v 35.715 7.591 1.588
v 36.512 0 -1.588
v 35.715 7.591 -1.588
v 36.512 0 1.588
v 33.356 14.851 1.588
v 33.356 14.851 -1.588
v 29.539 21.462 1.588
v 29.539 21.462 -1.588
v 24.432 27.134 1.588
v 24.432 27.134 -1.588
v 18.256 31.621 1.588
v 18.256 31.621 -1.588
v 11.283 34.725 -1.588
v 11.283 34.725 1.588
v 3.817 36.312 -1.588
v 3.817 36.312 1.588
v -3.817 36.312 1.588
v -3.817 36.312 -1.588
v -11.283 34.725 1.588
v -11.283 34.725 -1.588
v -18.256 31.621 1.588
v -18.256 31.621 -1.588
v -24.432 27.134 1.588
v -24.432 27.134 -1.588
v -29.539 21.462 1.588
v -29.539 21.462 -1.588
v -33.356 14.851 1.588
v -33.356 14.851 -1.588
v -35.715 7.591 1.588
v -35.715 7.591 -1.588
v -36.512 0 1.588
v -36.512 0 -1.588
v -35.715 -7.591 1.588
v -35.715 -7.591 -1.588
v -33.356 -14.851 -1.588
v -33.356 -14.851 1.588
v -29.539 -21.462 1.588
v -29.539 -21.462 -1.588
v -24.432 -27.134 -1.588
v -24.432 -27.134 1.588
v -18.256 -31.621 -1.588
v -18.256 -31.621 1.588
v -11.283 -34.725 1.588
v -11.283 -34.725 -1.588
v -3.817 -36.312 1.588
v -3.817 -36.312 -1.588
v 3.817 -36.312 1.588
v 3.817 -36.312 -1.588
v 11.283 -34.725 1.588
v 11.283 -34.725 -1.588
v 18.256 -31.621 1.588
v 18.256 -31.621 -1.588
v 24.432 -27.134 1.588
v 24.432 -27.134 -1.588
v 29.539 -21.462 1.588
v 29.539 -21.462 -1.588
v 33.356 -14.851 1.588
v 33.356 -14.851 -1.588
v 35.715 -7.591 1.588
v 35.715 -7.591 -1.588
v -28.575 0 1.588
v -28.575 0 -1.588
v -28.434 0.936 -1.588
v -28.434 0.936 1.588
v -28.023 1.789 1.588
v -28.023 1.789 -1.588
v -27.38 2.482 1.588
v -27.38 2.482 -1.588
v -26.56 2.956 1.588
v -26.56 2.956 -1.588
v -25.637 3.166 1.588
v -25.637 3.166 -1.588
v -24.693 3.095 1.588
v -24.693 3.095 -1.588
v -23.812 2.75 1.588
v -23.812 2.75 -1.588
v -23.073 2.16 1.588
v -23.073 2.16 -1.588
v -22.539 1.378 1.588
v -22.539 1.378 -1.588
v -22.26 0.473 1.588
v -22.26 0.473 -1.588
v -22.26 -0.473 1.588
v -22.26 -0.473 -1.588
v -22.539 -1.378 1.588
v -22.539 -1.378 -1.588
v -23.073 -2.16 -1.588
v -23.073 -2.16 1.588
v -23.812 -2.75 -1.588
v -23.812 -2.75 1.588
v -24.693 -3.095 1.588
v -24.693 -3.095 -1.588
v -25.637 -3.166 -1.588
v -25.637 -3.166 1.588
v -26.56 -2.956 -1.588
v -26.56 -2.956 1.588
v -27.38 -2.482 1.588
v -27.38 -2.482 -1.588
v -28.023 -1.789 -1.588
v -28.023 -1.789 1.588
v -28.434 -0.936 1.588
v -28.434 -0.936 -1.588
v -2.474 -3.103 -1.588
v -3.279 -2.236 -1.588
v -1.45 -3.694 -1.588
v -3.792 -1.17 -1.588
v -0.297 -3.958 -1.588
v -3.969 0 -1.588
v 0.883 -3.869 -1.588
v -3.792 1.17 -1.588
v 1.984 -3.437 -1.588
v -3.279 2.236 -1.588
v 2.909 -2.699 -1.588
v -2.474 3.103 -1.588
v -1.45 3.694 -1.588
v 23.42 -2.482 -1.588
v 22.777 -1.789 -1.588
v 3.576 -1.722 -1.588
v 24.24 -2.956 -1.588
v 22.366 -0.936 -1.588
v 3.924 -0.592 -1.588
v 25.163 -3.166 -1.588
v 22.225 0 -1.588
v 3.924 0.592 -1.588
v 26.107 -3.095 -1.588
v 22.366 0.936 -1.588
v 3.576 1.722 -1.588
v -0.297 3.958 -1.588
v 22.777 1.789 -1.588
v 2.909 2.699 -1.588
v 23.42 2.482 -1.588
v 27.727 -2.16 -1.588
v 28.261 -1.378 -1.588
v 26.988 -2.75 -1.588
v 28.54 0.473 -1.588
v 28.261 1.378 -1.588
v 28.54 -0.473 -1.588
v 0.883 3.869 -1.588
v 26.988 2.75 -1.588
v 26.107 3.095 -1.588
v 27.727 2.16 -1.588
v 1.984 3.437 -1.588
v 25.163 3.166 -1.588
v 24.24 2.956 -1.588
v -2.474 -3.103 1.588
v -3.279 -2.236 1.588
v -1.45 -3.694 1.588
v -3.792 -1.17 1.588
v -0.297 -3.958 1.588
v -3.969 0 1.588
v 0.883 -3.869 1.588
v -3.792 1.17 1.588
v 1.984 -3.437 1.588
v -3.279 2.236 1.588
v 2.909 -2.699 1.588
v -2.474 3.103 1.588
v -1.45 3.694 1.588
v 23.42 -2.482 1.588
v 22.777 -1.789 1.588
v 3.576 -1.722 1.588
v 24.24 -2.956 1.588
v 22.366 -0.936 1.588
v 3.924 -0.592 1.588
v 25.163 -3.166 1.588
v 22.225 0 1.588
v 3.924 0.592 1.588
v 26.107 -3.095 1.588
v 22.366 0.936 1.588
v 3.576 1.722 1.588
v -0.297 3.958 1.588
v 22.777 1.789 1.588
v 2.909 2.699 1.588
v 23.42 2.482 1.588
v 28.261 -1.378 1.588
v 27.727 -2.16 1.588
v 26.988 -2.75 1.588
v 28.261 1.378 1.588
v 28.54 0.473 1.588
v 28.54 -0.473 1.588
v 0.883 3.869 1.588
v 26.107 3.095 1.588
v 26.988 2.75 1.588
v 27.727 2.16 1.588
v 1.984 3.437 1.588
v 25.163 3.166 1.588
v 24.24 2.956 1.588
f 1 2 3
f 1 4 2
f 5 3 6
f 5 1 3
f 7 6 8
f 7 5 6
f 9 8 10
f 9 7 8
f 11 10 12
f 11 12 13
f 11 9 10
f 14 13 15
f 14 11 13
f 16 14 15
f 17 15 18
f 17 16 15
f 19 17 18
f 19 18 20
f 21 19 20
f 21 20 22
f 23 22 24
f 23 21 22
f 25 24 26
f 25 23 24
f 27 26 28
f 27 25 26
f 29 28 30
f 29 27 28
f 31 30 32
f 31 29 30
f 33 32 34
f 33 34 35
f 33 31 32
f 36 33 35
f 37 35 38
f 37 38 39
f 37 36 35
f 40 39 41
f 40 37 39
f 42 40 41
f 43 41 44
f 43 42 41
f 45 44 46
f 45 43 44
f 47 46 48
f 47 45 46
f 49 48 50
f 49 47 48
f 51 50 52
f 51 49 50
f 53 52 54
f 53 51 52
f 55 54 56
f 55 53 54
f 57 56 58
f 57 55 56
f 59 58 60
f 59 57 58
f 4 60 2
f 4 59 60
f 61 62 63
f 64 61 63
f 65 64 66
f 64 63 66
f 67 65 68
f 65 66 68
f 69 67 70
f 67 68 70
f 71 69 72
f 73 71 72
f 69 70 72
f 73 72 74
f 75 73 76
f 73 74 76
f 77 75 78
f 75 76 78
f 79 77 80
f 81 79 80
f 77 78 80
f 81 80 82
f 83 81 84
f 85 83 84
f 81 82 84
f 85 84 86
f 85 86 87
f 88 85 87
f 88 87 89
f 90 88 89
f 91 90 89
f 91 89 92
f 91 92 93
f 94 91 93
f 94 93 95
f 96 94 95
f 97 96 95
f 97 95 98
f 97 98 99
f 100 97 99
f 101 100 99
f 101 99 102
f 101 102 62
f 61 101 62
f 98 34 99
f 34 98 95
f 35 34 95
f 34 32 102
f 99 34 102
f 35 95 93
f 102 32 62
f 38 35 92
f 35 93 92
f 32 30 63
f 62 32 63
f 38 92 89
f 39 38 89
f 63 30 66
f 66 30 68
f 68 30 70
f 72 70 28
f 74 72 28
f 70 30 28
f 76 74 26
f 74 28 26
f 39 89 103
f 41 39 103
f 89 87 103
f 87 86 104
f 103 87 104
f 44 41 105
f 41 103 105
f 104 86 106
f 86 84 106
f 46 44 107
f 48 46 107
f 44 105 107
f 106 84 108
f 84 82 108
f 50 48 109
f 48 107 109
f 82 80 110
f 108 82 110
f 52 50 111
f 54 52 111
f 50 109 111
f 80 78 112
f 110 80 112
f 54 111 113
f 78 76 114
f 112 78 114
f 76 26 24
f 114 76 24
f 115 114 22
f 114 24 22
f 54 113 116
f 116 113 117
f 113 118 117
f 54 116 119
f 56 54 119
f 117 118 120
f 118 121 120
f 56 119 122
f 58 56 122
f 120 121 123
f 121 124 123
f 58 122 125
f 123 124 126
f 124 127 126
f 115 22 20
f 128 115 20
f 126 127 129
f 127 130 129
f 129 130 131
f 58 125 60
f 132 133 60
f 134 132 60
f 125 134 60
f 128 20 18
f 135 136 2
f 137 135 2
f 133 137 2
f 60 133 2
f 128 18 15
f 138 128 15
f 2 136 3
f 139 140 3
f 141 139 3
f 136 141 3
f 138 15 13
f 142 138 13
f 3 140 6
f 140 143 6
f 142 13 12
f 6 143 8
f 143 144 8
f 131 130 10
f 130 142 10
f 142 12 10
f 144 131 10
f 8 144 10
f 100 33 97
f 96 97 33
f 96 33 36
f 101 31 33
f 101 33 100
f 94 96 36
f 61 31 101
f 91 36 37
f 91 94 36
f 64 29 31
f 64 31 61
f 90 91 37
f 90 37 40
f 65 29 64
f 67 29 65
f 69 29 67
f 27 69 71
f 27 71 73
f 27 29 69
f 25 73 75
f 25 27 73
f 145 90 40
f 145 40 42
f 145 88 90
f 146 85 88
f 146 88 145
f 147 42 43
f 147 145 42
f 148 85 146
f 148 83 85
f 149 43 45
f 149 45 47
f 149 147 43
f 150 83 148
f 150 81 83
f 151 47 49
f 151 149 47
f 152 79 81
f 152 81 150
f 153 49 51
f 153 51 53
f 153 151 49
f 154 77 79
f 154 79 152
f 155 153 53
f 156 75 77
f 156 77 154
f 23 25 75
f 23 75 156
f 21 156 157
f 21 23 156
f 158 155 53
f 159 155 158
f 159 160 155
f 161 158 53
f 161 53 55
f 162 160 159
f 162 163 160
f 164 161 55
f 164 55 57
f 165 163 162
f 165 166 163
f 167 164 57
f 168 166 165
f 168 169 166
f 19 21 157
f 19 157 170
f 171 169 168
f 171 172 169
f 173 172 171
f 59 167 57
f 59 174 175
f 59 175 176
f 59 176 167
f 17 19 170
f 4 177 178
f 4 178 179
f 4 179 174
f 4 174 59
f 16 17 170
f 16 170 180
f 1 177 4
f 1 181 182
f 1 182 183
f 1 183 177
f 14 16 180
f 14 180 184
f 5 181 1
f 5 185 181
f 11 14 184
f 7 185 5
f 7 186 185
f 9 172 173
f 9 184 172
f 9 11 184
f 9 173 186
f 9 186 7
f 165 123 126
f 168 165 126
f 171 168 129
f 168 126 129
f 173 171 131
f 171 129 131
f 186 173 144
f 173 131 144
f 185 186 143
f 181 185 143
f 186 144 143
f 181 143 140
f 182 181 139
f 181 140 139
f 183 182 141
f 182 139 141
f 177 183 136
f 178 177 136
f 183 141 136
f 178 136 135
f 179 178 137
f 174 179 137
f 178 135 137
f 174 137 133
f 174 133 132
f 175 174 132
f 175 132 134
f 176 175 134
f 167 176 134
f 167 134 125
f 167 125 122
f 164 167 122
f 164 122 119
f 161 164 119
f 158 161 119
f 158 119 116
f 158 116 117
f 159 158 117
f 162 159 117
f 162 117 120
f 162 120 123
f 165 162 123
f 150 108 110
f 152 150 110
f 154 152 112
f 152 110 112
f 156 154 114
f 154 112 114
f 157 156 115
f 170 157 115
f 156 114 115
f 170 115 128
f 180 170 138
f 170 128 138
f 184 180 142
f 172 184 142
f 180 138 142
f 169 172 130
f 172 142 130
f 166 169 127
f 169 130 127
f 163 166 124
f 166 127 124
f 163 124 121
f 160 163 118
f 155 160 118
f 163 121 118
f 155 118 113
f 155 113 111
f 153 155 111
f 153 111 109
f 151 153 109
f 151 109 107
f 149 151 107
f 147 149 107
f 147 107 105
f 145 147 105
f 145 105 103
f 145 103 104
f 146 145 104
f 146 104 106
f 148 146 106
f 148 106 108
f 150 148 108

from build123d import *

# Parameters (mm, degrees)
SKETCH1_R                          = 36.5125
BOSS_EXTRUDE1_DEPTH                = 1.5875
F_1_4_0_25_DIAMETER_HOLE1_D        = 6.35
F_5_16_0_3125_DIAMETER_HOLE1_D     = 7.9375
F_5_16_0_3125_DIAMETER_HOLE1_DEPTH = 3.302


with BuildPart() as part:
    # Sketch1 → Boss-Extrude1 (new body, symmetric)
    with BuildSketch(Plane.XY):
        Circle(SKETCH1_R)
    extrude(amount=BOSS_EXTRUDE1_DEPTH, both=True)

    # 1/4 (0.25) Diameter Hole1 (through all)
    with Locations(Plane.XY.offset(1.5875)):
        with Locations((-25.4, 0), (25.4, 0)):
            Hole(F_1_4_0_25_DIAMETER_HOLE1_D / 2)

    # 5/16 (0.3125) Diameter Hole1
    with Locations(Plane.XY.offset(1.5875)):
        with Locations((0, 0)):
            Hole(F_5_16_0_3125_DIAMETER_HOLE1_D / 2, depth=F_5_16_0_3125_DIAMETER_HOLE1_DEPTH)


solid = part.part
